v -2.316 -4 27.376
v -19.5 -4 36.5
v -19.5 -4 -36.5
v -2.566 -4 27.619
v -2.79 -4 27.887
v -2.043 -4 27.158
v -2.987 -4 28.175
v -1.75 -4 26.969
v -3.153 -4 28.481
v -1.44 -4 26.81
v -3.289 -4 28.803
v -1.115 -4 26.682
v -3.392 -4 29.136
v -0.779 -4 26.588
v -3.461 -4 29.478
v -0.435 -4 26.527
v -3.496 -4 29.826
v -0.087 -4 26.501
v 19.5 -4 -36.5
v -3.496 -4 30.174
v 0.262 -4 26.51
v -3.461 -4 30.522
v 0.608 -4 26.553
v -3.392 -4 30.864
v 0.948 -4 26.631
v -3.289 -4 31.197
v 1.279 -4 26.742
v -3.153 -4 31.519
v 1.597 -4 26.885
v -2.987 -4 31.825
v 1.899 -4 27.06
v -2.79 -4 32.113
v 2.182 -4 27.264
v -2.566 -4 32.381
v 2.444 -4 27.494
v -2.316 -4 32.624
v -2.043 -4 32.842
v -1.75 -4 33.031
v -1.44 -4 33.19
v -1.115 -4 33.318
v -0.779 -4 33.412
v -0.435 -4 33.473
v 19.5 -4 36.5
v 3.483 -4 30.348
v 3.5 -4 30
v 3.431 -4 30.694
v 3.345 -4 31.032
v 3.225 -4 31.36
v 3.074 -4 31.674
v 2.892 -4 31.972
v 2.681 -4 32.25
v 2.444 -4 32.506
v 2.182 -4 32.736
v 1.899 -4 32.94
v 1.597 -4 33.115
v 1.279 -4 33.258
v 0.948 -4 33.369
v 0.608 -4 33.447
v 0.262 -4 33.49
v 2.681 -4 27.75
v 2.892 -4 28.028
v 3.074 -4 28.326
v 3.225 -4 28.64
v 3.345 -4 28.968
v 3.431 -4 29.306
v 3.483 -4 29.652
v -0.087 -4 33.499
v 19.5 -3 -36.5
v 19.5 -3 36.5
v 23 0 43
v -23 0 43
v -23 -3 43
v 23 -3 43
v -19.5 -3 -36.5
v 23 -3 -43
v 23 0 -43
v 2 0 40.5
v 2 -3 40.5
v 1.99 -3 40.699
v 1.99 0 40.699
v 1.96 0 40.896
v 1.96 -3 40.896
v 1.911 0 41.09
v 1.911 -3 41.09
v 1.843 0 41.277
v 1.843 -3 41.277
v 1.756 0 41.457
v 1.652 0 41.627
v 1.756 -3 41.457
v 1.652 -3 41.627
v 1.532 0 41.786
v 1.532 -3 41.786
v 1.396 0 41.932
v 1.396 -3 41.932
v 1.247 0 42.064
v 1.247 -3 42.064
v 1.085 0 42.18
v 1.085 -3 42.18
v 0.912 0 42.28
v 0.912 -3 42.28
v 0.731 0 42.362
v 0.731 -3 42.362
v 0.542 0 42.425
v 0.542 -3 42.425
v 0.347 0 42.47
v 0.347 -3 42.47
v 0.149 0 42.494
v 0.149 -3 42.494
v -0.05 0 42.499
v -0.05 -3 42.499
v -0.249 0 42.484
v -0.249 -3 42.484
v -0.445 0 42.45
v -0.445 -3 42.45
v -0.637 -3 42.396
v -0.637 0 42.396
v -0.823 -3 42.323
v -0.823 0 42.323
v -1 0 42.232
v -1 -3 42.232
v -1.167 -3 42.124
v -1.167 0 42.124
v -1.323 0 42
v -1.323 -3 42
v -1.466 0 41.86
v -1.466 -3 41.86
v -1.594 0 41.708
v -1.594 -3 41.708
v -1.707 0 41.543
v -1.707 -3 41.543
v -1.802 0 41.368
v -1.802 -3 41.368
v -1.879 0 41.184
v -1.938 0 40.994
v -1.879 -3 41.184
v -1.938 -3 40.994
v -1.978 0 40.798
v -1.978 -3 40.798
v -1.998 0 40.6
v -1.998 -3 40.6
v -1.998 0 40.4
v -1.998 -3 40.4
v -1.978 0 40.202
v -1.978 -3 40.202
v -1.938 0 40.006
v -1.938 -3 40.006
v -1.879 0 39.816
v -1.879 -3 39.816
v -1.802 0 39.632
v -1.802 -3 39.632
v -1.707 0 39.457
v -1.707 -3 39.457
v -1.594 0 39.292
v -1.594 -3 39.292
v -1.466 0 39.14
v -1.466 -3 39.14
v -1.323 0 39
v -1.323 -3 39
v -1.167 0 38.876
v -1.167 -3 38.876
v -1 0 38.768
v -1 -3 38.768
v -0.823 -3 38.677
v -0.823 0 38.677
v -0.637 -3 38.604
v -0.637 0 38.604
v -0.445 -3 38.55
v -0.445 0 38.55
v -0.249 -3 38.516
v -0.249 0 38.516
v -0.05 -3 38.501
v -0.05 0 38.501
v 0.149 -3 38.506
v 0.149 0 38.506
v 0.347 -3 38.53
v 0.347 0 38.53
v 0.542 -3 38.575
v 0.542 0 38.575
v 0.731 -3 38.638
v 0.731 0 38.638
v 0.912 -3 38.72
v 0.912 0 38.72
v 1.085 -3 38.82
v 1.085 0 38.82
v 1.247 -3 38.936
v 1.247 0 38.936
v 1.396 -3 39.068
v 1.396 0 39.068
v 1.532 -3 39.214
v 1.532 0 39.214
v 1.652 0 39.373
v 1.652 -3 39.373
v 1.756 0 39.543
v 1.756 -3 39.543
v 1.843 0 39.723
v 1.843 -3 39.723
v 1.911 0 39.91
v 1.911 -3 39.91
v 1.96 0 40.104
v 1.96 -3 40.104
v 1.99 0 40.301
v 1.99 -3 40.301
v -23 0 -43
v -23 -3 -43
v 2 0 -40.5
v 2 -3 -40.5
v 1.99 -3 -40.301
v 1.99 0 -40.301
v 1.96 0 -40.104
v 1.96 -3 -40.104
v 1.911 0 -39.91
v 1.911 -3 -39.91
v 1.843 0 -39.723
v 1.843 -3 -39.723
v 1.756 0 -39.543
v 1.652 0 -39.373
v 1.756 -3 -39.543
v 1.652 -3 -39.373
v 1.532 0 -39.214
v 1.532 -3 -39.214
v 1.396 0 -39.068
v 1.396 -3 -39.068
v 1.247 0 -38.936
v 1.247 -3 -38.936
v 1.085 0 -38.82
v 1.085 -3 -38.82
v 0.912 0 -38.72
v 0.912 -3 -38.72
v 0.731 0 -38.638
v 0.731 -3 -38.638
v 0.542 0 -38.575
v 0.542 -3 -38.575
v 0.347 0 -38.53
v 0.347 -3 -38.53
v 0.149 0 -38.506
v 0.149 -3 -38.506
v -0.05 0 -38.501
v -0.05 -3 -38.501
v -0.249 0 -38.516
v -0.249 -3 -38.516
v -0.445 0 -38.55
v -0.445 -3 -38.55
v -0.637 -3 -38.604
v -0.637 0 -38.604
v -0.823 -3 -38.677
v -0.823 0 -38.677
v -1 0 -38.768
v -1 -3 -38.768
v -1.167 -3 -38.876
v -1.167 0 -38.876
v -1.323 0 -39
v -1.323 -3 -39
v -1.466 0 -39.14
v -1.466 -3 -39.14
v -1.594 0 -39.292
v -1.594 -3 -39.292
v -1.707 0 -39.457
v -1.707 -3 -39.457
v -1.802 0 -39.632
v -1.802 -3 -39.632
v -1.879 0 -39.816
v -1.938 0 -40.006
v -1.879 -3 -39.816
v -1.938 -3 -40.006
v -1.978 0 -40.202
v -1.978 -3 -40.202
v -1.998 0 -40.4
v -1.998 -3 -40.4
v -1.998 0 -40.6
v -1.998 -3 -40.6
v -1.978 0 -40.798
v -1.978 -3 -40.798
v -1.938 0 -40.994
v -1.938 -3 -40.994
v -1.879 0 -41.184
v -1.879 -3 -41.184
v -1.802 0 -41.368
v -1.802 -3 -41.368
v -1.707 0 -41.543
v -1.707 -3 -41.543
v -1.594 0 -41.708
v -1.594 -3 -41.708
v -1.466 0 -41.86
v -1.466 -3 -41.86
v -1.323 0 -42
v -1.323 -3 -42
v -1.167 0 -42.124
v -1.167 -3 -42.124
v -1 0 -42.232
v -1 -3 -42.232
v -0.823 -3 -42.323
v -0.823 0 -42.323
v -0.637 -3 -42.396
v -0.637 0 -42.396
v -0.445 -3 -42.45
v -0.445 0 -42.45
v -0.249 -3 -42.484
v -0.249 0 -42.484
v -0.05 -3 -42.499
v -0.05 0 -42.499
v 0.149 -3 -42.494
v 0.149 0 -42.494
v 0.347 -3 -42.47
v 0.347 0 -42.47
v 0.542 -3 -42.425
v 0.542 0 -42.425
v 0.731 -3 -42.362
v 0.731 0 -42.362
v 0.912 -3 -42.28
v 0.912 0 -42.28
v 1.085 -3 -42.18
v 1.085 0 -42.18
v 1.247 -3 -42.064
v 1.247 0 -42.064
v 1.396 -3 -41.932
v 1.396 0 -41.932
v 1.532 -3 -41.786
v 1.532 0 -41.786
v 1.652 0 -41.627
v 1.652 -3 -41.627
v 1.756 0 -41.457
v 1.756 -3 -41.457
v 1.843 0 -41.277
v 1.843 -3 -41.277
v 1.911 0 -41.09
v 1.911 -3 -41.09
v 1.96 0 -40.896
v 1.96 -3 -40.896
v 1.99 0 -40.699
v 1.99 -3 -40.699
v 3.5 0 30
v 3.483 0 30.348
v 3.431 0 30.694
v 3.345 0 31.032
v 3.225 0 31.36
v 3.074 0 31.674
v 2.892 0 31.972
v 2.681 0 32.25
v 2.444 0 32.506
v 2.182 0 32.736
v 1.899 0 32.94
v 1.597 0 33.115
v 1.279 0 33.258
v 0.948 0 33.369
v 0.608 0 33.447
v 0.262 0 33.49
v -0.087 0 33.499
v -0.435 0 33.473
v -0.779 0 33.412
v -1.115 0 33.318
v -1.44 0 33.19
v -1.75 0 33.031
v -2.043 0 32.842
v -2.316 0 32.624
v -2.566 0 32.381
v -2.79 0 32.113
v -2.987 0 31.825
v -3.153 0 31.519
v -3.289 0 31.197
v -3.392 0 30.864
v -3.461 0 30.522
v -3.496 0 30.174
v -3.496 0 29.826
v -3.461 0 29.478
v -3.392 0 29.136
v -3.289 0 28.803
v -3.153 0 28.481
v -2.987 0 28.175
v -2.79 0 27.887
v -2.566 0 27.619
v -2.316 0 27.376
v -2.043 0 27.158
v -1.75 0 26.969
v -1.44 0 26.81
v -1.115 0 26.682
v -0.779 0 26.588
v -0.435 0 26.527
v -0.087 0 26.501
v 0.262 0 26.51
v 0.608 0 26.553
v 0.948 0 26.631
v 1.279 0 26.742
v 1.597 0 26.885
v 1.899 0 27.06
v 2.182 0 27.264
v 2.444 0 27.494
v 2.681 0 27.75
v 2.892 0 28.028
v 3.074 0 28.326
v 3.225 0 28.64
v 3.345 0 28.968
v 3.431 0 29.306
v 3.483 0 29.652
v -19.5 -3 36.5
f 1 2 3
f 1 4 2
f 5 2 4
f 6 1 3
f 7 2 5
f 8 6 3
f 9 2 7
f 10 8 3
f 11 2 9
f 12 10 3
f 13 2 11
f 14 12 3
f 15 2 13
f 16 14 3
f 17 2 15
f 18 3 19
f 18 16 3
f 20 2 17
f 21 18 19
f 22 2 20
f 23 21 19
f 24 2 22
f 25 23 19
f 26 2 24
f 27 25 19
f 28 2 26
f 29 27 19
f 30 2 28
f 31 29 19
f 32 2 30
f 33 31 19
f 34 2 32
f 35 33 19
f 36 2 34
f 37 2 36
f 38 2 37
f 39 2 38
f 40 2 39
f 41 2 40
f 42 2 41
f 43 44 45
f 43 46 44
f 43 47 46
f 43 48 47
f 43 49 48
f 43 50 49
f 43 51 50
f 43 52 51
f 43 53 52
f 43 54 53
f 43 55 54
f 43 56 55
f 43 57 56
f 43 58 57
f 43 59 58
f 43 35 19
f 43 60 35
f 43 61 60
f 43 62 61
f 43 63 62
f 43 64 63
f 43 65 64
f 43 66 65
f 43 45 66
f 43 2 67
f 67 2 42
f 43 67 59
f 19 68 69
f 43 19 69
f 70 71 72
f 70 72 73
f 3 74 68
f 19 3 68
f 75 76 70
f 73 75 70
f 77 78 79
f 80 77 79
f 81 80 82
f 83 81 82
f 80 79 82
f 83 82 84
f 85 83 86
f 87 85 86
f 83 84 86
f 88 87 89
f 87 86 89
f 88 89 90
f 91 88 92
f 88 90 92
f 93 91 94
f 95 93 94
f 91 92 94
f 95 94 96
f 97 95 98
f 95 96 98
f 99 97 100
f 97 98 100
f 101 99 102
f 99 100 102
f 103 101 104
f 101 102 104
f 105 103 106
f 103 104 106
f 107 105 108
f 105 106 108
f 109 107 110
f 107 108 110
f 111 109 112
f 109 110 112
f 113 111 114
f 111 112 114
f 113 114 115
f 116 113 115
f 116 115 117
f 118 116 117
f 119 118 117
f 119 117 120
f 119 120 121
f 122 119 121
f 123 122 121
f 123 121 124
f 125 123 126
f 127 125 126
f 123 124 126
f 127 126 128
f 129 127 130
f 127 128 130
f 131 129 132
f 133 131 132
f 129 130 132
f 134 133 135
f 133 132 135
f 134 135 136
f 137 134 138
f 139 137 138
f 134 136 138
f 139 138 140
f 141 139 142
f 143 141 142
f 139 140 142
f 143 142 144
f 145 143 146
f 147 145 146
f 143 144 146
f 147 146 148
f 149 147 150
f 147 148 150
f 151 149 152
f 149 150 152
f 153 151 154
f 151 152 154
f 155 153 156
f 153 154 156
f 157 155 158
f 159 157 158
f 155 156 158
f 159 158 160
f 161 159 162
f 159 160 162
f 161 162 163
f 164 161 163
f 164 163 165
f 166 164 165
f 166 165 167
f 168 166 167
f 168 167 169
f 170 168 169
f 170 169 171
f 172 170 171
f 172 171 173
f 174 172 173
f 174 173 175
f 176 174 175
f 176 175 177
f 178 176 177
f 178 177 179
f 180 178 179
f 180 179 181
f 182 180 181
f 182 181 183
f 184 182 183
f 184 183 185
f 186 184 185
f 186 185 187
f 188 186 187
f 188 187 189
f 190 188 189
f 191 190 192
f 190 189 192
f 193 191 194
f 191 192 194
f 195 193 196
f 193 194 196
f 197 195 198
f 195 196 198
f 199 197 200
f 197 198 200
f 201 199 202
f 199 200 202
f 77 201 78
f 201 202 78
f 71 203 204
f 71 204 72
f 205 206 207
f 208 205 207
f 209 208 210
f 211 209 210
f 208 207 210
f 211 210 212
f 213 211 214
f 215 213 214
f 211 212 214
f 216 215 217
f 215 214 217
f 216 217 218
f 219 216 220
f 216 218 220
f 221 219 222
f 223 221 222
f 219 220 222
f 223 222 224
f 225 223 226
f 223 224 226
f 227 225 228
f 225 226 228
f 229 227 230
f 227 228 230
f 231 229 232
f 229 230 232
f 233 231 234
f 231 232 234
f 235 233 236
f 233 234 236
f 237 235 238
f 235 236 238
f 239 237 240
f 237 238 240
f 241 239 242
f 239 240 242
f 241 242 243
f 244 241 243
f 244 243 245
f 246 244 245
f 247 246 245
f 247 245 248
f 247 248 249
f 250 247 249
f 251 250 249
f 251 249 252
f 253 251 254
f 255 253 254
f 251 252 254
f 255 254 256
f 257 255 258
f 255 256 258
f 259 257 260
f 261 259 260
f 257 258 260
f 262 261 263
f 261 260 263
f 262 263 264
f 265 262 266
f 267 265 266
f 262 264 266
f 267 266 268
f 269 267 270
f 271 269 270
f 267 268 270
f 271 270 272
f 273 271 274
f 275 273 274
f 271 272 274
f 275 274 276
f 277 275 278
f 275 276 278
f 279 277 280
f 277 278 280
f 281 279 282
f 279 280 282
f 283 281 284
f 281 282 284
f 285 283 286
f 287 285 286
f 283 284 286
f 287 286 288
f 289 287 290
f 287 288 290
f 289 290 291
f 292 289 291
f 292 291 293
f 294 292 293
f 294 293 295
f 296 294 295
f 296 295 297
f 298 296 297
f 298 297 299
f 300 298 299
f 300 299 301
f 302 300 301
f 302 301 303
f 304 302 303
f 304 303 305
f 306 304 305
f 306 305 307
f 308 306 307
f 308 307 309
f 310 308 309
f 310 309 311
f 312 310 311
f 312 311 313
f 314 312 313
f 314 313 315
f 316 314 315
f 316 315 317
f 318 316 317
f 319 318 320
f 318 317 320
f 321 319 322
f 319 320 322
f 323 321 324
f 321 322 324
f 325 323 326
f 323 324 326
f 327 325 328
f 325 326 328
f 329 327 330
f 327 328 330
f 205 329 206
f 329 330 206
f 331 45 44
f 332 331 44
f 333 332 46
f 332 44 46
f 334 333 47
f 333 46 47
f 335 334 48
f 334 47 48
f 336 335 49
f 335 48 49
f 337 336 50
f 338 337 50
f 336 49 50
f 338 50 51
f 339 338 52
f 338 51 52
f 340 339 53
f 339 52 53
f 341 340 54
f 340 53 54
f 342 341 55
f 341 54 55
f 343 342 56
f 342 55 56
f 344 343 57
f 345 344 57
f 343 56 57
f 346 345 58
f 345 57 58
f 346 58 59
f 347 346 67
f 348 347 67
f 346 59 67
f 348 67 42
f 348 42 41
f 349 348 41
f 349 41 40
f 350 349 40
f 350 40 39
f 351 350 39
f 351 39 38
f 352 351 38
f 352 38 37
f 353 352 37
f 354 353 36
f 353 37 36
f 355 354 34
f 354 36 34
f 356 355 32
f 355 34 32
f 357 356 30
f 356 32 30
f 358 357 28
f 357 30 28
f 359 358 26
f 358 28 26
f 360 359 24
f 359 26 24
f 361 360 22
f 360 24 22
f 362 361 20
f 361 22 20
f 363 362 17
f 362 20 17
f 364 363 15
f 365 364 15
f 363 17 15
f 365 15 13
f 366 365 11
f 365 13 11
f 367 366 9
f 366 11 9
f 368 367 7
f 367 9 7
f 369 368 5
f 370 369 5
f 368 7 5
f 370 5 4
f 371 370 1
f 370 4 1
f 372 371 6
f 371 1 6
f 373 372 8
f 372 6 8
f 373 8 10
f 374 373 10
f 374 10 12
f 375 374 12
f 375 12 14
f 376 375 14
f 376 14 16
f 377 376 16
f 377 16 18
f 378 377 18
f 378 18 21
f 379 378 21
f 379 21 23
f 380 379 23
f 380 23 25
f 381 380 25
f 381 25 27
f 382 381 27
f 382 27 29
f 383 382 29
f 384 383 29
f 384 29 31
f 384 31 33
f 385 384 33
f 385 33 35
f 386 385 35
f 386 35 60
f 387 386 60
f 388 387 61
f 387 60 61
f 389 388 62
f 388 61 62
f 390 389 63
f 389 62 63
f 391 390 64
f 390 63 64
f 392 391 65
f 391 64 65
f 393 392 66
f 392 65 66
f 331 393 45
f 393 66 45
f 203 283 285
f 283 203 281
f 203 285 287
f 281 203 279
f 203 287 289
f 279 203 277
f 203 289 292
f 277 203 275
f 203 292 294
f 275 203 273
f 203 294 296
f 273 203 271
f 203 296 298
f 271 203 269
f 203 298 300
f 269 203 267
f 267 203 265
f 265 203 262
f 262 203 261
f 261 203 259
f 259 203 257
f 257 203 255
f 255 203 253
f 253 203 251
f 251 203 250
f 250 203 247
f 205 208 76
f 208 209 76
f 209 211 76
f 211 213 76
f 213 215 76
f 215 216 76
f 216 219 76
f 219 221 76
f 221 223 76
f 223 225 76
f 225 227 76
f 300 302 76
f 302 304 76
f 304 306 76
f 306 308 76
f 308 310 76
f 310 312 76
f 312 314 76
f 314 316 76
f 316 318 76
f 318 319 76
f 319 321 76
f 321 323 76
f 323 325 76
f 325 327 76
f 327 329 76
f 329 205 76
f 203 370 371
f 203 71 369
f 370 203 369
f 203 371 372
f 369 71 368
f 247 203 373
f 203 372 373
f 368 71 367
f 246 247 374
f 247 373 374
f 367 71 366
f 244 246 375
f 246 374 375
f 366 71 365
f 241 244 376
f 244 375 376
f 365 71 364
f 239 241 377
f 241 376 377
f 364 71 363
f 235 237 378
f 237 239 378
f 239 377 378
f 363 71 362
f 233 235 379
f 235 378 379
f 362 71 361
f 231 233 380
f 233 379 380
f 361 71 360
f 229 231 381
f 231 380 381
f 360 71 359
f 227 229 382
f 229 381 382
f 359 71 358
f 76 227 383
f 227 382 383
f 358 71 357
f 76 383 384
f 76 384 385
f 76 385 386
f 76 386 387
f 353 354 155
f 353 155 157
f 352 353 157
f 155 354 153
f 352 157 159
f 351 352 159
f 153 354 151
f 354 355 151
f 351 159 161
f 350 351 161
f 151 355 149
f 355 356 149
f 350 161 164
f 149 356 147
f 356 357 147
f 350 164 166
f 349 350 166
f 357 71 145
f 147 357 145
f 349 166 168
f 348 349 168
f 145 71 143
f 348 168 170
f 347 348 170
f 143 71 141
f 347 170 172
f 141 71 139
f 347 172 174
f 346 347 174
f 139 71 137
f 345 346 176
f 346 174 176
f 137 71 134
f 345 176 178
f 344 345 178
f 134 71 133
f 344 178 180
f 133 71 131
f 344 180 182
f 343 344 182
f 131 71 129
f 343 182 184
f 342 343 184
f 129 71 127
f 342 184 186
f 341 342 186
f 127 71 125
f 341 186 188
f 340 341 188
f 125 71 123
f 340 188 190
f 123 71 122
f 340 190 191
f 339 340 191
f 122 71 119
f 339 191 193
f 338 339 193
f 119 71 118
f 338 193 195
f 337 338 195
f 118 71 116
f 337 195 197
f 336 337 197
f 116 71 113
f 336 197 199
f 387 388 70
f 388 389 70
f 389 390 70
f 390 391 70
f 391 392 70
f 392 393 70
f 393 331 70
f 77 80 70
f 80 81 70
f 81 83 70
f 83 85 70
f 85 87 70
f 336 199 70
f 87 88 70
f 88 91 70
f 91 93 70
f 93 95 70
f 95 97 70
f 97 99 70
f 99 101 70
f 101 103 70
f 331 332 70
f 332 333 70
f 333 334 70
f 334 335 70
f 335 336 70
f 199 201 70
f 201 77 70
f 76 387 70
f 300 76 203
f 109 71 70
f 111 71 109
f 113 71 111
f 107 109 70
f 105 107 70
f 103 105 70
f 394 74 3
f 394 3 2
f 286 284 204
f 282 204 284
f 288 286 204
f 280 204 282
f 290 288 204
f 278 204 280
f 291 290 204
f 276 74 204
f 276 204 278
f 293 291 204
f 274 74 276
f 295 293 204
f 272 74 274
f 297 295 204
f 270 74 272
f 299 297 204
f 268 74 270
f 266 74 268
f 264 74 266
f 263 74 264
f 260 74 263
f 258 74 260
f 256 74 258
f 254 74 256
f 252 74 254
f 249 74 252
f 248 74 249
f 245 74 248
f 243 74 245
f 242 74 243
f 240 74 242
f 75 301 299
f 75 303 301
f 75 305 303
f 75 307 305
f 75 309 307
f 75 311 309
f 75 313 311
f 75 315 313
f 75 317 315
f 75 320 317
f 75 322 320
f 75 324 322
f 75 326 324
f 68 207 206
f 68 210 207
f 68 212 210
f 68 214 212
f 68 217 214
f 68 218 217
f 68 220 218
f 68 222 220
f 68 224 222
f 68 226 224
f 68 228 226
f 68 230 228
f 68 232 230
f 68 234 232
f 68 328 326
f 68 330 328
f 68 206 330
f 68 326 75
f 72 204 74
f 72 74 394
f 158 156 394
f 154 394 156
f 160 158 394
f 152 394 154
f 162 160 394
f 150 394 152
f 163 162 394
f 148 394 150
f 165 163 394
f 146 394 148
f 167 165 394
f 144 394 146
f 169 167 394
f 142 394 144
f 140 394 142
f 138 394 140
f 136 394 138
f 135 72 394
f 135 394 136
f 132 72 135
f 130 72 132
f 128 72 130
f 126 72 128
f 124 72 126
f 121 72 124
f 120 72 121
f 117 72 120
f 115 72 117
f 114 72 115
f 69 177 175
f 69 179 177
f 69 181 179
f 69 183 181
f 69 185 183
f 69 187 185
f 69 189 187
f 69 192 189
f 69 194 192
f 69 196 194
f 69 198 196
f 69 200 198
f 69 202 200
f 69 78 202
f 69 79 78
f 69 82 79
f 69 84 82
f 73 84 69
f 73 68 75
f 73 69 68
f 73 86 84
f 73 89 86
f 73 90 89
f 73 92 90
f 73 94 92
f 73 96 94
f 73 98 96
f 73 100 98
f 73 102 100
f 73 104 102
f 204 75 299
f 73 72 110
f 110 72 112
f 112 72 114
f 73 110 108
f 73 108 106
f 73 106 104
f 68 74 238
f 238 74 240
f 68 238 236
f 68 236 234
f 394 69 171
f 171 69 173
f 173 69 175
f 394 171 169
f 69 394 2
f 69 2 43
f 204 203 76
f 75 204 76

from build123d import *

# Parameters (mm, degrees)
F0_W     = 46
F0_H     = 86
F1_DEPTH = 3
F2_W     = 39
F2_H     = 73
F3_DEPTH = 1
F4_R     = 2
F5_DEPTH = 3
F6_R     = 3.5
F7_DEPTH = 4


with BuildPart() as f1:
    # F0 (on Front) → F1 (new body)
    with BuildSketch(Plane.XZ):
        Rectangle(F0_W, F0_H)
    extrude(amount=F1_DEPTH)

    # F2 (on face) → F3 (join)
    with BuildSketch(Plane.XZ.offset(3)):
        Rectangle(F2_W, F2_H)
    extrude(amount=F3_DEPTH)

    # F4 (on face) → F5 (cut)
    with BuildSketch(Plane.XZ.offset(3)):
        with Locations((0, 40.5)):
            Circle(F4_R)
        with Locations((0, -40.5)):
            Circle(F4_R)
    extrude(amount=-F5_DEPTH, mode=Mode.SUBTRACT)

    # F6 (on face) → F7 (cut)
    with BuildSketch(Plane.XZ.offset(4)):
        with Locations((0, 30)):
            Circle(F6_R)
    extrude(amount=-F7_DEPTH, mode=Mode.SUBTRACT)


solid = f1.part
